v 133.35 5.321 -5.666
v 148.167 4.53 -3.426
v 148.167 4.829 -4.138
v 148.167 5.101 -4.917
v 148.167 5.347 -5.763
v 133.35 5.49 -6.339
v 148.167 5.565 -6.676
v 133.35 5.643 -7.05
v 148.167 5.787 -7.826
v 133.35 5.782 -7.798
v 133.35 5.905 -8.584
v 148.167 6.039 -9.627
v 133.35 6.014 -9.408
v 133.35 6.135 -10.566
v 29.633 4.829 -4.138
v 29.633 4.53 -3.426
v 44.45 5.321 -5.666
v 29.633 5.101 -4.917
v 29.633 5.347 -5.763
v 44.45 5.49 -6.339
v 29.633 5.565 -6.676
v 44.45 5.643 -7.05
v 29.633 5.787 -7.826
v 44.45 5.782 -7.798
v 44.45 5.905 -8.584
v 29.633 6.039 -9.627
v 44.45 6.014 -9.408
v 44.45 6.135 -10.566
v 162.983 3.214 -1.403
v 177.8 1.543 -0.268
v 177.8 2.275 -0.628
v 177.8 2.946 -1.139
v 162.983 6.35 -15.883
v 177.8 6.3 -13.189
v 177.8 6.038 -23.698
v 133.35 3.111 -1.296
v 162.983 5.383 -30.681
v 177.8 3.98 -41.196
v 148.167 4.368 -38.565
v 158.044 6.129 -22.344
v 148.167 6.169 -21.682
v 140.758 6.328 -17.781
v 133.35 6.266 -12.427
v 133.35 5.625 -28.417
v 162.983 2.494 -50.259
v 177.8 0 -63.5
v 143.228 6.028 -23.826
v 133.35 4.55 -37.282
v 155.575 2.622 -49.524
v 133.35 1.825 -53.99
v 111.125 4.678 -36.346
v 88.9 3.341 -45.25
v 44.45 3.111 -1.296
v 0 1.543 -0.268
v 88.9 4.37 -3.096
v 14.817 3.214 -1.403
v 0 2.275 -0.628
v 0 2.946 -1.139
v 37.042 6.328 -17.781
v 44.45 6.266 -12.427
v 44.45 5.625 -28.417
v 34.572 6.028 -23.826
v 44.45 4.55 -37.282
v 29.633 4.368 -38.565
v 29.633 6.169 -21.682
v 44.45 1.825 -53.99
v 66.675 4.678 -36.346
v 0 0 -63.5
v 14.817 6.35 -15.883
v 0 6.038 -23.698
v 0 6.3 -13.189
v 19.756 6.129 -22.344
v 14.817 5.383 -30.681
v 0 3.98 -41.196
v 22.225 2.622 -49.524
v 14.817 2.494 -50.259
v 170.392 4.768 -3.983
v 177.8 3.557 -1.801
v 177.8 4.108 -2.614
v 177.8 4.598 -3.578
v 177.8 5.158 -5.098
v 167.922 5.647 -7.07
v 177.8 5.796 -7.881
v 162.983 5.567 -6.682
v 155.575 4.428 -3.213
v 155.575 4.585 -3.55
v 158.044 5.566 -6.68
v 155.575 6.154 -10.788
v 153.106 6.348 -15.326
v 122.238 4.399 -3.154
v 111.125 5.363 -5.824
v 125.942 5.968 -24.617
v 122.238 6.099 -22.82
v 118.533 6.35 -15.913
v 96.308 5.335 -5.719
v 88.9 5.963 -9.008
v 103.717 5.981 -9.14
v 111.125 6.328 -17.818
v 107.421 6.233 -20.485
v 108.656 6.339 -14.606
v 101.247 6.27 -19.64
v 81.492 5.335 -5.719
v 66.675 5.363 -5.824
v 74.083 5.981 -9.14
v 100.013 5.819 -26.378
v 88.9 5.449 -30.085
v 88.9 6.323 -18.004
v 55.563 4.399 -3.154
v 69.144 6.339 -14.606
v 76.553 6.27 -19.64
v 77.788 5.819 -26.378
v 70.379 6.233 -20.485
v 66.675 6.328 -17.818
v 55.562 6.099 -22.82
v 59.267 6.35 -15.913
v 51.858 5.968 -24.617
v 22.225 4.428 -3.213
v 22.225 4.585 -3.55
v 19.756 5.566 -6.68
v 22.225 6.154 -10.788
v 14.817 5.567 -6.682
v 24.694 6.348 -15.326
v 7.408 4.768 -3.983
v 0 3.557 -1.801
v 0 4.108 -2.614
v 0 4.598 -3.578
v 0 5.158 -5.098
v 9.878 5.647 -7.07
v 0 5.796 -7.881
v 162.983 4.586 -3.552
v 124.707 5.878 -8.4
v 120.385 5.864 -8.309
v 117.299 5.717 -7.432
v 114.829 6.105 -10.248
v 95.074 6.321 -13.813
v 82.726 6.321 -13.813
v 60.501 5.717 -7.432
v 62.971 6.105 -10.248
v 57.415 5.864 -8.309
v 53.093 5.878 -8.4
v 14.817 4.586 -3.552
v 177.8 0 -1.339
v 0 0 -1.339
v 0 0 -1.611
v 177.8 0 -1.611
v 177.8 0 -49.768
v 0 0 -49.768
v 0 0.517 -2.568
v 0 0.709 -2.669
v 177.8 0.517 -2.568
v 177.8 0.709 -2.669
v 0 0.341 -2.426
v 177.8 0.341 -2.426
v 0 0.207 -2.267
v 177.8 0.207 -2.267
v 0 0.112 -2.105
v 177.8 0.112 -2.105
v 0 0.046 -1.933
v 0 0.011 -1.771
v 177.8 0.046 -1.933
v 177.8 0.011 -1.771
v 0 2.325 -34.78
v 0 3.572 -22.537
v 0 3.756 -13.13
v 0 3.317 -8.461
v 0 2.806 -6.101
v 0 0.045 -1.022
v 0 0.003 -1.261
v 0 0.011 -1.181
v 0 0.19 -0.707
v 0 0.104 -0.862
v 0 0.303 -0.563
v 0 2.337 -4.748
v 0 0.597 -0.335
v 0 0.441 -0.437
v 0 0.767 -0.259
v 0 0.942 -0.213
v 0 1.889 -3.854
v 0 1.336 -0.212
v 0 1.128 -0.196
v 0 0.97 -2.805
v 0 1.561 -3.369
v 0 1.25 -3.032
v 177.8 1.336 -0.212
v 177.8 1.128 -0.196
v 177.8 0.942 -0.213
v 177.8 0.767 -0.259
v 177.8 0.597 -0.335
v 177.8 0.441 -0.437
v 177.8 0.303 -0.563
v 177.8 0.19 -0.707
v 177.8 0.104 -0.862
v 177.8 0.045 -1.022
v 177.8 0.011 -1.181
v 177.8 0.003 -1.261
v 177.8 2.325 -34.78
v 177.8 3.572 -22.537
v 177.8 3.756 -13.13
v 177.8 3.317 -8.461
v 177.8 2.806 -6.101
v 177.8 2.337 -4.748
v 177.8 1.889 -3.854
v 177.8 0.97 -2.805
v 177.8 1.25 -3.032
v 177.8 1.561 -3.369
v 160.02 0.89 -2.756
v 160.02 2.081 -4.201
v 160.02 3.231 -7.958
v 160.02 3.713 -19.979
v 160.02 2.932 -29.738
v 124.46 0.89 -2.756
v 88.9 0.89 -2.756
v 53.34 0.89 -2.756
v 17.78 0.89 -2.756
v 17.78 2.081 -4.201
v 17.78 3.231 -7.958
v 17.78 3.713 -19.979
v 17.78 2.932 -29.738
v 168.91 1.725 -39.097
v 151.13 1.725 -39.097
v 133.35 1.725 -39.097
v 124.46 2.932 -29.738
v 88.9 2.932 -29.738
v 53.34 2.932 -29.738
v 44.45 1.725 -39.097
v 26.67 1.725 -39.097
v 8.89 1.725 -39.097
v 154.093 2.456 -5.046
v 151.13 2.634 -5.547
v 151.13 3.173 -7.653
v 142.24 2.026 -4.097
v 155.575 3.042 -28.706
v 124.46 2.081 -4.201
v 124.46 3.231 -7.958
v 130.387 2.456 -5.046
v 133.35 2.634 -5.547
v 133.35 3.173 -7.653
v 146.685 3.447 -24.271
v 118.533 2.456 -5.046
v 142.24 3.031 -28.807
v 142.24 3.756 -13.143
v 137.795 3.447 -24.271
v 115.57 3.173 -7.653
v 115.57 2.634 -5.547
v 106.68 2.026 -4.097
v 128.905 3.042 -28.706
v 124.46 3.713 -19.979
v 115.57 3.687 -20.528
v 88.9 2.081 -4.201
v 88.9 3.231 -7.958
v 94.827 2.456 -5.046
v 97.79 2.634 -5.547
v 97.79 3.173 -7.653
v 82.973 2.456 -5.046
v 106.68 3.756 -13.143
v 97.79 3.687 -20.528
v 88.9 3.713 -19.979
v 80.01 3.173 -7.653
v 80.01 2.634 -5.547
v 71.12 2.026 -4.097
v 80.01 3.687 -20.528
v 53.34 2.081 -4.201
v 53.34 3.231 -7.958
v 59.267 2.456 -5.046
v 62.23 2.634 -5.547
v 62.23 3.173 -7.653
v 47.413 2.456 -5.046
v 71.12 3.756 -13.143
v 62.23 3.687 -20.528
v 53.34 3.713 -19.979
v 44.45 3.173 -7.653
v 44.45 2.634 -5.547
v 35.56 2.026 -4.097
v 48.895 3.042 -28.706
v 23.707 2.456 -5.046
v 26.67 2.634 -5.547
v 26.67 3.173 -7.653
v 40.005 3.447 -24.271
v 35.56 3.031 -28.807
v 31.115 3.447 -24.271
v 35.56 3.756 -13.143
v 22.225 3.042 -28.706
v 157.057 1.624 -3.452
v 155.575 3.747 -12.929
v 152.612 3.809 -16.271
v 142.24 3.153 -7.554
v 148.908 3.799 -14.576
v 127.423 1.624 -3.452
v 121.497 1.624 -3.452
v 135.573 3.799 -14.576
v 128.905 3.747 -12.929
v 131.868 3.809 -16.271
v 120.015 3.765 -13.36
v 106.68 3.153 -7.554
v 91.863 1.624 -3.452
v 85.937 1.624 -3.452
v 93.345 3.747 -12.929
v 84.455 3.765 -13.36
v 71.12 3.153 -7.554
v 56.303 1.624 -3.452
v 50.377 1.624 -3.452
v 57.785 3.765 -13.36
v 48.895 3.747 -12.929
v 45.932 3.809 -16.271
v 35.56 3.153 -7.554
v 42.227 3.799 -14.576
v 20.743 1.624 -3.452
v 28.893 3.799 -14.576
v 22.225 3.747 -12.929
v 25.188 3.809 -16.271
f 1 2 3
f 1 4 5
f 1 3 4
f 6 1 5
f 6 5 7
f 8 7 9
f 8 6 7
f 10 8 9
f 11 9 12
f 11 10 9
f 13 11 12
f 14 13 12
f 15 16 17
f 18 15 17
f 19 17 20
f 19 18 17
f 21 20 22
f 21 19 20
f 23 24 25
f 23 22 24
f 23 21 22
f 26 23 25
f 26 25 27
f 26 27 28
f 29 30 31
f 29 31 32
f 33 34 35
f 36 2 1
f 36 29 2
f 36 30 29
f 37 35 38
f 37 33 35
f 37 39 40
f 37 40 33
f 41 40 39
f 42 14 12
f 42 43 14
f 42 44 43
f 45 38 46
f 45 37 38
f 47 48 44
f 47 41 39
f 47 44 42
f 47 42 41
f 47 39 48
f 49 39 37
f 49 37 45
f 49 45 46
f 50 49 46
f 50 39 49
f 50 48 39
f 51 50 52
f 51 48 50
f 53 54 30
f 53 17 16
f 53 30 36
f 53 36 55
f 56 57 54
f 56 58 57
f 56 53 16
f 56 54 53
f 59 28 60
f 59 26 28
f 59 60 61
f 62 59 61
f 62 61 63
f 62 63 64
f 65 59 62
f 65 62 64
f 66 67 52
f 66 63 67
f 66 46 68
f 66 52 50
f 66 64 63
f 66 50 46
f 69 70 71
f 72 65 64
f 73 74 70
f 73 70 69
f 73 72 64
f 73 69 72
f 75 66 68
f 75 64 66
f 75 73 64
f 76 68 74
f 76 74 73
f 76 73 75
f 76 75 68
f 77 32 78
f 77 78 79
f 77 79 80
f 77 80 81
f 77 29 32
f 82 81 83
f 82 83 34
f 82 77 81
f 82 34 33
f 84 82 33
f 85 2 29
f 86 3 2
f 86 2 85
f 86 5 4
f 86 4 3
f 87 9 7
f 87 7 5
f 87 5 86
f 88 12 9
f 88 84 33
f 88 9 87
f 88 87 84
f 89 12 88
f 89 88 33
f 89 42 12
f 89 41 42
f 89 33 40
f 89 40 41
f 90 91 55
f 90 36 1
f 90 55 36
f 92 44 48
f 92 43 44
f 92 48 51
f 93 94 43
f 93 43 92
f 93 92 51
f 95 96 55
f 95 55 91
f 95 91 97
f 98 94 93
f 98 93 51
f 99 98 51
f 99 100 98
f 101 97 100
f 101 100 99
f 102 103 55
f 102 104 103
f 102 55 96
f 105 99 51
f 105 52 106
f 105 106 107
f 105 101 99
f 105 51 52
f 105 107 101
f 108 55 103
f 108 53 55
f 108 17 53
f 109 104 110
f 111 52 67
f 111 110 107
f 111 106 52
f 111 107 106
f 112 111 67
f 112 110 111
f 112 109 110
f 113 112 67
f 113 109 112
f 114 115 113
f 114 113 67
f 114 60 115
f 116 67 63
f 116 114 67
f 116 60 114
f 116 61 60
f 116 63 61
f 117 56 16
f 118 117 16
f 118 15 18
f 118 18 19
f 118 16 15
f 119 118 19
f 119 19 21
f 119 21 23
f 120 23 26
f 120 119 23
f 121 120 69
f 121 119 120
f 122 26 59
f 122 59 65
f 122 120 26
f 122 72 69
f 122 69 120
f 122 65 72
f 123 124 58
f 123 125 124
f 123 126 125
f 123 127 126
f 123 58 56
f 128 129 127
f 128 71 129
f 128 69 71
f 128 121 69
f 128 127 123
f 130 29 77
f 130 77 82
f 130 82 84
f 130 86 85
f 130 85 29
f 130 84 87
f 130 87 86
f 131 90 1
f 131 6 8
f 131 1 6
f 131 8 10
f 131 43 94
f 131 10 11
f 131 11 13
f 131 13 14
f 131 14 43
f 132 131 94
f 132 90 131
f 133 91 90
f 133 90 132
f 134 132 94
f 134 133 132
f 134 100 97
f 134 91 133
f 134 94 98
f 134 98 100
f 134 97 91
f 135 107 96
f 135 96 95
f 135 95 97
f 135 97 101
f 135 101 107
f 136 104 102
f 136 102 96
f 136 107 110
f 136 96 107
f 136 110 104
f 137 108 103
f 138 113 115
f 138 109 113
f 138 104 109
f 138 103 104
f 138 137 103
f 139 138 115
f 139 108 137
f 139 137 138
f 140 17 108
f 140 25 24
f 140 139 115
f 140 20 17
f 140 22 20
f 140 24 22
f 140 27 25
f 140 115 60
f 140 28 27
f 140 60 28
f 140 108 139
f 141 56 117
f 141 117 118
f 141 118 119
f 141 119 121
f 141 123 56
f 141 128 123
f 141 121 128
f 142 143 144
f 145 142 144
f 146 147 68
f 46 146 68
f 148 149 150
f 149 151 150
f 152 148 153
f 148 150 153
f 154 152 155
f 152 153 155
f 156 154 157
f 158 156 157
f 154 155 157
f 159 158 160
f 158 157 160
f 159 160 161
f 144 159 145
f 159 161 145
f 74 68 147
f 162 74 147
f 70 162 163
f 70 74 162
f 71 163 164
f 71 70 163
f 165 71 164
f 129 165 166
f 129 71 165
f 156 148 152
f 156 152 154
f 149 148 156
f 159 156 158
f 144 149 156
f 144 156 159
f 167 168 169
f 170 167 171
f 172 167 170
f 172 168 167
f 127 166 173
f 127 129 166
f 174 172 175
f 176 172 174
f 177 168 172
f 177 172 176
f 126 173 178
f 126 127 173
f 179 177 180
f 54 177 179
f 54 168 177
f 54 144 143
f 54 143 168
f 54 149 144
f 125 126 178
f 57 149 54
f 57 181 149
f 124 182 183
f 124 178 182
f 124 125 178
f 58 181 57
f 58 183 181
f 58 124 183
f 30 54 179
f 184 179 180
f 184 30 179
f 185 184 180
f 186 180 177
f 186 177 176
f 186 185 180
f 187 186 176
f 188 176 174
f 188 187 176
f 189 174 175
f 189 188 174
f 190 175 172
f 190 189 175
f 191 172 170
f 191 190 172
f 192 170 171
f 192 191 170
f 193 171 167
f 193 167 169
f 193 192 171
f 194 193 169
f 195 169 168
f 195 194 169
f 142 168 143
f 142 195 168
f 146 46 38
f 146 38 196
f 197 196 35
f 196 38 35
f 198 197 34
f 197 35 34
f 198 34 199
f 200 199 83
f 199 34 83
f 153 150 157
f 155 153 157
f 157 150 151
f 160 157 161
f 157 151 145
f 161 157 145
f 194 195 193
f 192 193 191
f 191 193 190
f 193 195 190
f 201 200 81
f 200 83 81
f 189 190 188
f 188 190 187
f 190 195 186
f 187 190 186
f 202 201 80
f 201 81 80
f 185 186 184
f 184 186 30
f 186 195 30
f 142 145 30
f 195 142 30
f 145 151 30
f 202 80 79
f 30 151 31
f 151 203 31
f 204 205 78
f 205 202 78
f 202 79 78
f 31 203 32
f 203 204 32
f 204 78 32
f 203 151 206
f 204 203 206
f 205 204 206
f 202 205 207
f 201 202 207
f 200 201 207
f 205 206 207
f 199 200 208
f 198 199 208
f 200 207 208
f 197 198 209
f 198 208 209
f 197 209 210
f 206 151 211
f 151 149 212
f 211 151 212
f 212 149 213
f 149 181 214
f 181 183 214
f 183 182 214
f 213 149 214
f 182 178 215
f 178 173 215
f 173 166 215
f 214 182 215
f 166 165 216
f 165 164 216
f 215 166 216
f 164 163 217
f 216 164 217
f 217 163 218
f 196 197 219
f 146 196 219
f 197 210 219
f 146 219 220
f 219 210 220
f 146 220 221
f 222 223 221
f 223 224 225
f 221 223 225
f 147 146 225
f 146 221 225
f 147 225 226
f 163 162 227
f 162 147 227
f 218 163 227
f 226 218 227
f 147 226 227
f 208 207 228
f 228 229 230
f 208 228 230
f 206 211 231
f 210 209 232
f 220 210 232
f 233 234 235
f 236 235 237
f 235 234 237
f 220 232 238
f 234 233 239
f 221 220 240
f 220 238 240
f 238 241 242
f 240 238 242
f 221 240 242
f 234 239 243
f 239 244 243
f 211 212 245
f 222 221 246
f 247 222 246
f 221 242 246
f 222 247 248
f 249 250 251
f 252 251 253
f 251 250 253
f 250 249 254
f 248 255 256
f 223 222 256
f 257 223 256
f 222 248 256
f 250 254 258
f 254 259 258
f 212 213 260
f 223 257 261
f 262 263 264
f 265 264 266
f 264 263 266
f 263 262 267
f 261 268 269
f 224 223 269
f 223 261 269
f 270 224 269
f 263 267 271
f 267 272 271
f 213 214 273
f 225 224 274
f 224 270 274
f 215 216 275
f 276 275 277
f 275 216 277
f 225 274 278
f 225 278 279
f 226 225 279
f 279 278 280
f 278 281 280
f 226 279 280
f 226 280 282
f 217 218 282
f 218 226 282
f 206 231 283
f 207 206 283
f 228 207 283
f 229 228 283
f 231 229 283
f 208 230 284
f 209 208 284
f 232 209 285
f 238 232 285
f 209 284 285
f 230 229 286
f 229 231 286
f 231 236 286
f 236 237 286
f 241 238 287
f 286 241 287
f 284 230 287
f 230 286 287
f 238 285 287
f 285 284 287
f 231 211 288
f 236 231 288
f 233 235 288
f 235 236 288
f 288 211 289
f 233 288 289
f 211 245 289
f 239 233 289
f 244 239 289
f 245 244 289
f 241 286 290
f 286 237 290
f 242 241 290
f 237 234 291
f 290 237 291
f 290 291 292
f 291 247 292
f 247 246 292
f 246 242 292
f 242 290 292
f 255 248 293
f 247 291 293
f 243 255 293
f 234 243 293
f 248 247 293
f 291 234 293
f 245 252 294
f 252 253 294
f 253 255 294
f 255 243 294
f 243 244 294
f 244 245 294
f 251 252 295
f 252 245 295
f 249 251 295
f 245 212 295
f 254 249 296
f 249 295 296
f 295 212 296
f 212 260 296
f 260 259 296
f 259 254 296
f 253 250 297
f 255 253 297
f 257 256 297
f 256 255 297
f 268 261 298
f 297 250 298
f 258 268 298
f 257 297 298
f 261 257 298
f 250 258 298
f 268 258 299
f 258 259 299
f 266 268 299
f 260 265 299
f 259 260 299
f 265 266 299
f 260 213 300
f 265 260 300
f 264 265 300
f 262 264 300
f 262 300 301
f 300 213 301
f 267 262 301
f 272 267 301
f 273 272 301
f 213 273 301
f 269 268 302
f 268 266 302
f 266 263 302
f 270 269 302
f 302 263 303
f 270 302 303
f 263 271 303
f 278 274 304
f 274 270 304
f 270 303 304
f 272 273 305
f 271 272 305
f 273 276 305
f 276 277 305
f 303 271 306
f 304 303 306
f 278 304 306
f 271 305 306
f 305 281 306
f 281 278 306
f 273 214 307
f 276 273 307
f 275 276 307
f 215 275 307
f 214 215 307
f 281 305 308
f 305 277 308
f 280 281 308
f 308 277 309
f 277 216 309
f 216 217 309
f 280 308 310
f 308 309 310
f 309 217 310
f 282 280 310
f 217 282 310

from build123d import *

# Parameters (mm, degrees)
BOSS_EXTRUDE1_DEPTH = 177.8
FILLET1_R           = 1.143


with BuildPart() as part:
    # Sketch1 → Boss-Extrude1 (new body)
    with BuildSketch(Plane(origin=(0, 0, 0), x_dir=(0, 0, -1), z_dir=(1, 0, 0))):
        with BuildLine():
            add(Edge.make_bspline(
                [(0, 0), (0, 12.7), (63.5, 0)],
                knots=[0, 0, 0, 1, 1, 1], degree=2))
            Line((0, 0), (2.54, 0))
            add(Edge.make_bspline(
                [(2.54, 0), (2.543542174, 0.291970761), (2.652908762, 0.705261199), (2.893700113, 1.137187569), (3.567045726, 1.749770153), (4.834908518, 2.413179532), (6.72016171, 3.004506298), (9.814502842, 3.570276806), (15.611303824, 3.906307508), (24.345788638, 3.519882535), (38.440550634, 1.983319347), (49.767711448, 0)],
                knots=[0, 0, 0, 0.046875, 0.09375, 0.15625, 0.21875, 0.28125, 0.34375, 0.4375, 0.5625, 0.6875, 0.889213761, 0.889213761, 0.889213761], degree=2))
            Line((49.767711448, 0), (63.5, 0))
        make_face()
    extrude(amount=BOSS_EXTRUDE1_DEPTH)

    # Fillet1
    fillet1_edges = [part.edges().sort_by_distance(p)[0] for p in [
        (88.9, 0, -2.54),
        (88.9, 0, 0),
    ]]
    fillet(fillet1_edges, radius=FILLET1_R)


solid = part.part
